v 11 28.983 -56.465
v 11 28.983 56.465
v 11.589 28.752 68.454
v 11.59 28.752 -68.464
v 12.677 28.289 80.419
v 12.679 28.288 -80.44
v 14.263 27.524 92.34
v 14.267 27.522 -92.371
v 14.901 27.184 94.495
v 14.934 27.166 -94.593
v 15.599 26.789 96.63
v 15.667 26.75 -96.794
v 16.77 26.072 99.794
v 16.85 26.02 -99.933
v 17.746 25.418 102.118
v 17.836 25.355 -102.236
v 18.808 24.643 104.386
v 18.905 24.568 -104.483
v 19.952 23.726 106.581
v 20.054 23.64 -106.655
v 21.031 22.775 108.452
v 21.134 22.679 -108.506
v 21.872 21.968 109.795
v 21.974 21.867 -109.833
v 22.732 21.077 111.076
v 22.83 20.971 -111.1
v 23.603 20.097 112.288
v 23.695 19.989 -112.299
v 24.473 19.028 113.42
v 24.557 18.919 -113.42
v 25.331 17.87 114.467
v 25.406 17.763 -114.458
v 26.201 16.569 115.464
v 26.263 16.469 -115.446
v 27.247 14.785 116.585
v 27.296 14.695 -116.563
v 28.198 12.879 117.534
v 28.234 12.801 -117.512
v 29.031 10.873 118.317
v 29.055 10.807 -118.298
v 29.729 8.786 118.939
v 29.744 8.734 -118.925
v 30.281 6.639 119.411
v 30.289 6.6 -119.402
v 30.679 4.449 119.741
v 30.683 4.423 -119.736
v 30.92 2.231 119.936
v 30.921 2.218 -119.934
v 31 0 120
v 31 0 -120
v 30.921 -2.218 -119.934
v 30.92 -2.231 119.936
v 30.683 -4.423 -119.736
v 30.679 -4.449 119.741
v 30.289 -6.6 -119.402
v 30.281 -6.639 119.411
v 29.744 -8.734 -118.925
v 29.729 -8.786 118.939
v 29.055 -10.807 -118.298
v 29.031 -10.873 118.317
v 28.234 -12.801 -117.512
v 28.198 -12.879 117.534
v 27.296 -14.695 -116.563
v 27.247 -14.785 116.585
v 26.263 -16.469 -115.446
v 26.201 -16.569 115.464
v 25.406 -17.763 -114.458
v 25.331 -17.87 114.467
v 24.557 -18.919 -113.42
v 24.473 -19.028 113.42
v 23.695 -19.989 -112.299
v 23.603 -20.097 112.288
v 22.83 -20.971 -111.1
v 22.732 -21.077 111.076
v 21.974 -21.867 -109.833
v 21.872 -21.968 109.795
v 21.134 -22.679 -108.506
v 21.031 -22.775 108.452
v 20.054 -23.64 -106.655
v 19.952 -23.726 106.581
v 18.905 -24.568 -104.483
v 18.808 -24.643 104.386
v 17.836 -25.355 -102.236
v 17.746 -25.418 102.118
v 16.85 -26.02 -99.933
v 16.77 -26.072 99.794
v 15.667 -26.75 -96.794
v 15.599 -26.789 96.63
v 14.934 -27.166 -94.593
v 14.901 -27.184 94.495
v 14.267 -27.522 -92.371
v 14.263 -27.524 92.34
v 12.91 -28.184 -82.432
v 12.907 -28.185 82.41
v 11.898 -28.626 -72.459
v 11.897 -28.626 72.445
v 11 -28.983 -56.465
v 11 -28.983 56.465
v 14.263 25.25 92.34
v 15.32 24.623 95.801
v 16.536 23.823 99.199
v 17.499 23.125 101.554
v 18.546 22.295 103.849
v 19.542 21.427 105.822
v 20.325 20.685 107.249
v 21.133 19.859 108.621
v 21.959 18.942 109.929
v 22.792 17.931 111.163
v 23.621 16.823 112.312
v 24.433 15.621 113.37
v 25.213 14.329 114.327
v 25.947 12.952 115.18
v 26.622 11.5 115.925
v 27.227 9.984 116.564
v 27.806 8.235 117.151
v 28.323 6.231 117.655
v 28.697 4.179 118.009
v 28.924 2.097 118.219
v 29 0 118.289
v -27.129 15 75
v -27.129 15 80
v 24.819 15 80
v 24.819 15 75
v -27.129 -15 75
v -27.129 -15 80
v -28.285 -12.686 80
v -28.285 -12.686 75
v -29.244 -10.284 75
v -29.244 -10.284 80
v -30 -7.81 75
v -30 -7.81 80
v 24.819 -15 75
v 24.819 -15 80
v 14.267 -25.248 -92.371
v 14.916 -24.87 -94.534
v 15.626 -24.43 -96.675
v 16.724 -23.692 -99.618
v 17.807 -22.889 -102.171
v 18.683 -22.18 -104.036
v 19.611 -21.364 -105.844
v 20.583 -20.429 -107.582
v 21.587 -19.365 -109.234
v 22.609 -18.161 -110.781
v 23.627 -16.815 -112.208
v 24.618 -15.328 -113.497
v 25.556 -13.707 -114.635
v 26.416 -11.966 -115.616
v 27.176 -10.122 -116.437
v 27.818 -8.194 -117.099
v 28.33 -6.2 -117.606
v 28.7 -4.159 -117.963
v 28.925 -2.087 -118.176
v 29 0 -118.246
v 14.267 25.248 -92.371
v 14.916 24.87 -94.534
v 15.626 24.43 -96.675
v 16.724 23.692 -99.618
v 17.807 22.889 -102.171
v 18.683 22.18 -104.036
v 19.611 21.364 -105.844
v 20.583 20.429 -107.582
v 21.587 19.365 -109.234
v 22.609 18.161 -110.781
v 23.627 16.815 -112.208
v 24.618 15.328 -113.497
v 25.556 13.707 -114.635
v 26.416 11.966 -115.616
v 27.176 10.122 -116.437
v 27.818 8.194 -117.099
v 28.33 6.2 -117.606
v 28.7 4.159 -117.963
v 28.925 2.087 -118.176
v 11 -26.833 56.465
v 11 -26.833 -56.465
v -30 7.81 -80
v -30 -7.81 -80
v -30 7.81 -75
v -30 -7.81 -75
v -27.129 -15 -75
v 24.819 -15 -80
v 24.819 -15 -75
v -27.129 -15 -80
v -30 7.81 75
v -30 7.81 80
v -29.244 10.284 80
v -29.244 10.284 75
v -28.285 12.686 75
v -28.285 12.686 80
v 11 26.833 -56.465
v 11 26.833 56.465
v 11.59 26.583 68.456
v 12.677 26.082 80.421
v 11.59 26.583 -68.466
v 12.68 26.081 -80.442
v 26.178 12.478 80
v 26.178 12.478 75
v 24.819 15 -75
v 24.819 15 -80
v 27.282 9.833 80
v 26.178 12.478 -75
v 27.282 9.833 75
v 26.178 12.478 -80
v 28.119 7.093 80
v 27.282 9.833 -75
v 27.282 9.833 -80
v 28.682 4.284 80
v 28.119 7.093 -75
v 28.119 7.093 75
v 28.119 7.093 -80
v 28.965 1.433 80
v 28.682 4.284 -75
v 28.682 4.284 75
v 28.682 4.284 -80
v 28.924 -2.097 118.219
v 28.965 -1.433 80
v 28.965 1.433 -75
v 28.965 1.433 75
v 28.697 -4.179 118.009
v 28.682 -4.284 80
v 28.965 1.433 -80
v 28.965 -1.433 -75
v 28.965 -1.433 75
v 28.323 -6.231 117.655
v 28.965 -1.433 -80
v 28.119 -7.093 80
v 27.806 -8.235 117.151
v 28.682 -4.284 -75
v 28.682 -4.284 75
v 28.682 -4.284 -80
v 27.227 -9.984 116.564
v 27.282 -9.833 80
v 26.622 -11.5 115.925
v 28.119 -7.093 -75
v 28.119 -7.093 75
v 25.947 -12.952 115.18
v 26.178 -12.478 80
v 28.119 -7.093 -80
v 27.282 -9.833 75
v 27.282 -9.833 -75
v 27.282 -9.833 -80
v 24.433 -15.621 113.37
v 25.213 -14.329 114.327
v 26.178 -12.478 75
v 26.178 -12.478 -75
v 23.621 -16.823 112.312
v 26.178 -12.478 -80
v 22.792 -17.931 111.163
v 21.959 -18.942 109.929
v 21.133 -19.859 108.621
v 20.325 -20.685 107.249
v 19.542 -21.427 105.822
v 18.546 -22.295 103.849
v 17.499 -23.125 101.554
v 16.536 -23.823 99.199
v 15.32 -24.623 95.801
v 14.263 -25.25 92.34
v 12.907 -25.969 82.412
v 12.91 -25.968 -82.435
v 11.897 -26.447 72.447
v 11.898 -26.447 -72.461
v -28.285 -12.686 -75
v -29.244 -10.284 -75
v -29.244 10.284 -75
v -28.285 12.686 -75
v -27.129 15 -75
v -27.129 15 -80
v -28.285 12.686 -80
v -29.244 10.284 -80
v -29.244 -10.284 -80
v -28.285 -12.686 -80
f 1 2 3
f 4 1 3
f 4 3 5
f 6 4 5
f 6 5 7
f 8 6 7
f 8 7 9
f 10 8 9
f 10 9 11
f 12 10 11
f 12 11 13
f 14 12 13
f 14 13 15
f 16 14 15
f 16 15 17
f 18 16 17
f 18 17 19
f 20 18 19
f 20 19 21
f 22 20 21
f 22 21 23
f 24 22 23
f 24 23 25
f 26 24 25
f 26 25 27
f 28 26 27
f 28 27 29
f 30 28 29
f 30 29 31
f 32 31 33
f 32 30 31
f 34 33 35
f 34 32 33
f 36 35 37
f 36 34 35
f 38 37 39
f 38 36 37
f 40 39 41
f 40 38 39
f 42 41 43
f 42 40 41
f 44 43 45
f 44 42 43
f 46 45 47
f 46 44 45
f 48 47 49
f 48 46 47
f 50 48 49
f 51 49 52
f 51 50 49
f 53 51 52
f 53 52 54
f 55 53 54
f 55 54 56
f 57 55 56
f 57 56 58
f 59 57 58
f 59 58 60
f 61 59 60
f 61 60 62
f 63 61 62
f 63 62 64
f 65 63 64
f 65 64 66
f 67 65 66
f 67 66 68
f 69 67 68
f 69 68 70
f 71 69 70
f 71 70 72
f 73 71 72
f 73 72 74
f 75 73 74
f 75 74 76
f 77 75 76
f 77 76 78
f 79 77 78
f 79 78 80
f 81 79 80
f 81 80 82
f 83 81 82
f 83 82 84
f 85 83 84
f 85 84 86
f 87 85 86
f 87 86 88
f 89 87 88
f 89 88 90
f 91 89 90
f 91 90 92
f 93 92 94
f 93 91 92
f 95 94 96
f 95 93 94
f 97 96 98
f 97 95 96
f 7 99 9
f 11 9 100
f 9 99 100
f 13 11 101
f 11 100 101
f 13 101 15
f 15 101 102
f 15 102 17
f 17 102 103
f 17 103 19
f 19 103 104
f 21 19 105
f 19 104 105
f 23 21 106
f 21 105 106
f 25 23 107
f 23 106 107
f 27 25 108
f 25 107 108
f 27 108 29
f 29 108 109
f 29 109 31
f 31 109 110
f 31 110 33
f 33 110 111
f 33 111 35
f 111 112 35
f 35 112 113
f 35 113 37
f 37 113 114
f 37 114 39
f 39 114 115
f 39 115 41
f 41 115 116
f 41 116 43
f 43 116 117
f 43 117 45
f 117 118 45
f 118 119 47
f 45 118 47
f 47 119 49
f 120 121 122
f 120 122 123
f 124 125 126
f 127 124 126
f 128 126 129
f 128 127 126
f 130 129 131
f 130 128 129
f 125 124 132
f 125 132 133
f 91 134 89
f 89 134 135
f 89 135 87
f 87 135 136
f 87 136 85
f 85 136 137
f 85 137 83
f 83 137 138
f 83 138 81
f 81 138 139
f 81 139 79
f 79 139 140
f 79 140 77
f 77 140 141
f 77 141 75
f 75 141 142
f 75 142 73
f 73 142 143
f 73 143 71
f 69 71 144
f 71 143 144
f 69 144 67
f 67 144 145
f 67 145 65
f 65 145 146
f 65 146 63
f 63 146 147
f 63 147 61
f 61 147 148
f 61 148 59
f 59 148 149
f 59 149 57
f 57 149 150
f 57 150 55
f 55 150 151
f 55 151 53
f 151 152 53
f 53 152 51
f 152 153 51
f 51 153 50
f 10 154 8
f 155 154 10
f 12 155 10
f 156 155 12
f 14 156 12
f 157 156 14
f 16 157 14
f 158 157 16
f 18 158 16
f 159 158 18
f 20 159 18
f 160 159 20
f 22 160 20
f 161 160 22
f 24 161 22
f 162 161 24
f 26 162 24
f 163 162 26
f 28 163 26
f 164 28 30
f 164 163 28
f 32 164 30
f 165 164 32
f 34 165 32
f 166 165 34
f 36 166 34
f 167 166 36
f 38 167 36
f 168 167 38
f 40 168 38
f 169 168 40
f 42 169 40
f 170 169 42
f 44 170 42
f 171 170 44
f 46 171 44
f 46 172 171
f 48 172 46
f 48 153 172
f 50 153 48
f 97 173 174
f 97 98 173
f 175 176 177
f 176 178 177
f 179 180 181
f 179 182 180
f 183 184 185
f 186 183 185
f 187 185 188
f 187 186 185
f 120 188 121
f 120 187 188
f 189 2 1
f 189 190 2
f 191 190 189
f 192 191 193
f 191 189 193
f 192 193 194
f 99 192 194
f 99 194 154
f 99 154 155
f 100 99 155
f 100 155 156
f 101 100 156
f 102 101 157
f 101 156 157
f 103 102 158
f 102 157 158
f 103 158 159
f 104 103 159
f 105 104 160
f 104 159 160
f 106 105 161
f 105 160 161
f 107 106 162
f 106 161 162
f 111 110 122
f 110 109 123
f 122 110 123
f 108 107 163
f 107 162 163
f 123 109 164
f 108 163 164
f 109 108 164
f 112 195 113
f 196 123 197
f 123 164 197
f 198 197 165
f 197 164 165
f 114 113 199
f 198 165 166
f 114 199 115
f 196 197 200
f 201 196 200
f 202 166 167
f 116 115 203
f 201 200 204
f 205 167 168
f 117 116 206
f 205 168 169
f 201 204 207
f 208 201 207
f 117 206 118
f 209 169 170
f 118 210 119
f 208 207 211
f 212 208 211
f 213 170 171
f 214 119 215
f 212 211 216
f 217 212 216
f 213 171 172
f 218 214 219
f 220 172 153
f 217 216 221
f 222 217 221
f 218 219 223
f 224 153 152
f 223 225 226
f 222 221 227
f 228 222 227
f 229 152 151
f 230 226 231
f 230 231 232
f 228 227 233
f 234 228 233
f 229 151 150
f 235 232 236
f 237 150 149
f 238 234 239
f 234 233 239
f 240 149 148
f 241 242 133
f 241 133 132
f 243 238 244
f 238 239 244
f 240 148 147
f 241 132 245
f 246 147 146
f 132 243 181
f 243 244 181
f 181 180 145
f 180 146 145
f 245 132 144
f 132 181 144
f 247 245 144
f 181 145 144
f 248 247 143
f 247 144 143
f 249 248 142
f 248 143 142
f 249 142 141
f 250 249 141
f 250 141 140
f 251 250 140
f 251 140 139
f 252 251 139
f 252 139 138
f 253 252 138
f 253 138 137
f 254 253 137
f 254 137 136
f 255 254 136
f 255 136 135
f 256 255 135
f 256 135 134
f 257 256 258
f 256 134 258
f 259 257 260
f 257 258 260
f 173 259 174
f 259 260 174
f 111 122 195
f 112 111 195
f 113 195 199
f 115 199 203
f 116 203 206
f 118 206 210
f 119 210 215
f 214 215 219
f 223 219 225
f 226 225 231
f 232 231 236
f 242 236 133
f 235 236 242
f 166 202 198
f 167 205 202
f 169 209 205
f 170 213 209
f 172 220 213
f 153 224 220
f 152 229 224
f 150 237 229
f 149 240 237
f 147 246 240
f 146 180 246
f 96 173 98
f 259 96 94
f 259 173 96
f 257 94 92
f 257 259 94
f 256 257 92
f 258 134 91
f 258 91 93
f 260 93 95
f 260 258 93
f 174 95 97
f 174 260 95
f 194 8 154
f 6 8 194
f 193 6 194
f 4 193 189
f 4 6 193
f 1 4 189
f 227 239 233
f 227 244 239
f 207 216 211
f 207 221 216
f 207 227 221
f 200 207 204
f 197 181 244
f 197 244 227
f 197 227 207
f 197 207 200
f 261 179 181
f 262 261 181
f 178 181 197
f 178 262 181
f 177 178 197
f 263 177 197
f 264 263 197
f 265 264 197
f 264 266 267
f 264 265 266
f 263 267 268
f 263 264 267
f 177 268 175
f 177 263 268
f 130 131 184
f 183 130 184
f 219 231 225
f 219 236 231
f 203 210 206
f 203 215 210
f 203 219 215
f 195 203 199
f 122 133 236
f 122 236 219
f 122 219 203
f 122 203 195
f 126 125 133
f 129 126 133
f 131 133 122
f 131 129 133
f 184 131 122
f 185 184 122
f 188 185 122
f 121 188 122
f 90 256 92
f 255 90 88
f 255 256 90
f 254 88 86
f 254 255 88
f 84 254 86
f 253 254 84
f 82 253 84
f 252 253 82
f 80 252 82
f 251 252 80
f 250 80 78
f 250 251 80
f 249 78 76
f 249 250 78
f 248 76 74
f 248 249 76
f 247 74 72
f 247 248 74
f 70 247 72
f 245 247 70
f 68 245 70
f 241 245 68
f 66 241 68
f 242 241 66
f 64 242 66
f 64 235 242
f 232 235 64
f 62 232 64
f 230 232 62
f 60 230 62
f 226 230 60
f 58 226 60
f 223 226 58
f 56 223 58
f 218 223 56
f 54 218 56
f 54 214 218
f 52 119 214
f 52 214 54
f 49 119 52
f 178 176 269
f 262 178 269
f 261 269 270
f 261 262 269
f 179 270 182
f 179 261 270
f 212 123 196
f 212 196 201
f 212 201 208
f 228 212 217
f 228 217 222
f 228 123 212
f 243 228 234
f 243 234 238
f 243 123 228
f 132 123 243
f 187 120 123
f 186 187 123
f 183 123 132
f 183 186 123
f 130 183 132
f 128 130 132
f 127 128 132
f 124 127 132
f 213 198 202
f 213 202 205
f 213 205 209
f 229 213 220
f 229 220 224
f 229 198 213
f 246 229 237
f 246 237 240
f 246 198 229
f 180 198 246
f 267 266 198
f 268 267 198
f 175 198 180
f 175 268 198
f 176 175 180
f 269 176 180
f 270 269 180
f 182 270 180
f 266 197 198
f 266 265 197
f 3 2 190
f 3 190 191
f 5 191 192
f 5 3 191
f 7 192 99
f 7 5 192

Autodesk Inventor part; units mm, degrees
ref_plane "XY Plane" through (0, 0, 0) normal (0, 0, 1) x (1, 0, 0)
sketch "Skizze1" plane through (0, 0, 0) normal (0, 0, 1) x (1, 0, 0)
  circle A0 centre (0, 0) radius 31
  circle A1 centre (0, 0) radius 29
  dimension "d0" = 62
  dimension "d1" = 58
extrude "Extrusion1" add sketch "Skizze1" along normal mid plane 300
sketch "Skizze2" plane through (0, 0, 0) normal (0, 1, 0) x (-1, 0, 0)
  line L0 (-11, 169.5773) -> (-11, -169.8146) construction
  line L1 (-74.8376, 0) -> (82.6362, 0) construction
  line L2 (-11, 75) -> (-11, -75)
  line L3 (-31, -150) -> (-31, 150) projected
  line L4 (31, 150) -> (-31, 150) projected
  line L5 (-31, -150) -> (31, -150) projected
  spline S0 degree 2 poles (-11, 75) (-17.8298, 136.4739) (-72.8449, 128.3193) knots 0 0 0 1 1 1
  spline S1 degree 2 poles (-11, -75) (-17.6171, -136.2673) (-74.8376, -130) knots 0 0 0 1 1 1
  line L6 (-72.8449, 128.3193) -> (-74.8376, -130)
  line L7 (-31, 120) -> (-31, 150)
  line L8 (-31, 150) -> (31, 150)
  line L9 (31, 150) -> (31, -150)
  line L10 (31, -150) -> (31, 150) projected
  line L11 (31, -150) -> (-31, -150)
  line L12 (-31, -150) -> (-31, -120)
  point P0 (0, 0)
  dimension "d4" = 11
  dimension "d5" = 150
  dimension "d6" = 30
  dimension "d7" = 30
extrude "Extrusion3" cut sketch "Skizze2" along normal mid plane 100 contours S0 L3 L4 L9 L5 S1 L2
ref_plane "Arbeitsebene3" through (0, 33.25, 0) normal (0, 1, 0) x (-1, 0, 0)
sketch "Skizze8" plane through (0, 33.25, 0) normal (0, 1, 0) x (-1, 0, 0)
  line L0 (-11, -75) -> (-11, 75) projected
  arc A0 (-11, 56.4646) -> (-14.2842, 92.4804) centre (-300.1138, 48.2584) ccw
  arc A1 (-11, 56.4646) -> (-14.2842, 92.4804) centre (-31.6354, 72.7405) ccw
  point P0 (0, 0)
extrude "Extrusion6" cut sketch "Skizze8" against normal blind 65
mirror "Spiegeln2" about plane through (0, 0, 0) normal (0, 0, 1) of "Extrusion6"
ref_plane "Arbeitsebene7" through (15, 0, 0) normal (1, 0, 0) x (0, 1, 0)
sketch "Skizze13" plane through (15, 0, 0) normal (1, 0, 0) x (0, 1, 0)
  line L0 (-18, 80) -> (-15, 80)
  line L1 (-15, 80) -> (-15, -80)
  line L2 (-15, -80) -> (-18, -80)
  line L3 (-18, -80) -> (-18, 80)
  line L4 (15, 80) -> (18, 80)
  line L5 (18, 80) -> (18, -80)
  line L6 (18, -80) -> (15, -80)
  line L7 (15, -80) -> (15, 80)
  line L8 (0, 161.0458) -> (0, -181.8657) construction
  line L9 (-78.3289, 0) -> (67.3027, 0) construction
  point P0 (0, 0)
  dimension "d66" = 30
  dimension "d67" = 3
  dimension "d68" = 3
  dimension "d69" = 160
extrude "Extrusion11" [suppressed]
sketch "Skizze14" plane through (15, 0, 0) normal (1, 0, 0) x (0, 1, 0)
  line L0 (-51.8177, 0) -> (40.0312, 0) construction
  line L1 (0, 87.1429) -> (0, -189.8015) construction
  line L2 (-15, 80) -> (15, 80)
  line L3 (15, 80) -> (15, 75)
  line L4 (15, 75) -> (-15, 75)
  line L5 (-15, 75) -> (-15, 80)
  line L6 (-15, -75) -> (15, -75)
  line L7 (15, -75) -> (15, -80)
  line L8 (15, -80) -> (-15, -80)
  line L9 (-15, -80) -> (-15, -75)
  point P0 (0, 0)
  dimension "d72" = 5
  dimension "d73" = 5
  dimension "d74" = 150
  dimension "d75" = 30
  dimension "d76" = 30
extrude "Extrusion12" add sketch "Skizze14" against normal blind 45
extrude "Extrusion13" add sketch "Skizze14" along normal blind 15
sketch "Skizze15" plane through (0, 0, 0) normal (0, 0, 1) x (1, 0, 0)
  circle A0 centre (0, 0) radius 31
  circle A1 centre (0, 0) radius 35.4738
extrude "Extrusion14" cut sketch "Skizze15" along normal mid plane 250
properties part number "_3D-Druck"
